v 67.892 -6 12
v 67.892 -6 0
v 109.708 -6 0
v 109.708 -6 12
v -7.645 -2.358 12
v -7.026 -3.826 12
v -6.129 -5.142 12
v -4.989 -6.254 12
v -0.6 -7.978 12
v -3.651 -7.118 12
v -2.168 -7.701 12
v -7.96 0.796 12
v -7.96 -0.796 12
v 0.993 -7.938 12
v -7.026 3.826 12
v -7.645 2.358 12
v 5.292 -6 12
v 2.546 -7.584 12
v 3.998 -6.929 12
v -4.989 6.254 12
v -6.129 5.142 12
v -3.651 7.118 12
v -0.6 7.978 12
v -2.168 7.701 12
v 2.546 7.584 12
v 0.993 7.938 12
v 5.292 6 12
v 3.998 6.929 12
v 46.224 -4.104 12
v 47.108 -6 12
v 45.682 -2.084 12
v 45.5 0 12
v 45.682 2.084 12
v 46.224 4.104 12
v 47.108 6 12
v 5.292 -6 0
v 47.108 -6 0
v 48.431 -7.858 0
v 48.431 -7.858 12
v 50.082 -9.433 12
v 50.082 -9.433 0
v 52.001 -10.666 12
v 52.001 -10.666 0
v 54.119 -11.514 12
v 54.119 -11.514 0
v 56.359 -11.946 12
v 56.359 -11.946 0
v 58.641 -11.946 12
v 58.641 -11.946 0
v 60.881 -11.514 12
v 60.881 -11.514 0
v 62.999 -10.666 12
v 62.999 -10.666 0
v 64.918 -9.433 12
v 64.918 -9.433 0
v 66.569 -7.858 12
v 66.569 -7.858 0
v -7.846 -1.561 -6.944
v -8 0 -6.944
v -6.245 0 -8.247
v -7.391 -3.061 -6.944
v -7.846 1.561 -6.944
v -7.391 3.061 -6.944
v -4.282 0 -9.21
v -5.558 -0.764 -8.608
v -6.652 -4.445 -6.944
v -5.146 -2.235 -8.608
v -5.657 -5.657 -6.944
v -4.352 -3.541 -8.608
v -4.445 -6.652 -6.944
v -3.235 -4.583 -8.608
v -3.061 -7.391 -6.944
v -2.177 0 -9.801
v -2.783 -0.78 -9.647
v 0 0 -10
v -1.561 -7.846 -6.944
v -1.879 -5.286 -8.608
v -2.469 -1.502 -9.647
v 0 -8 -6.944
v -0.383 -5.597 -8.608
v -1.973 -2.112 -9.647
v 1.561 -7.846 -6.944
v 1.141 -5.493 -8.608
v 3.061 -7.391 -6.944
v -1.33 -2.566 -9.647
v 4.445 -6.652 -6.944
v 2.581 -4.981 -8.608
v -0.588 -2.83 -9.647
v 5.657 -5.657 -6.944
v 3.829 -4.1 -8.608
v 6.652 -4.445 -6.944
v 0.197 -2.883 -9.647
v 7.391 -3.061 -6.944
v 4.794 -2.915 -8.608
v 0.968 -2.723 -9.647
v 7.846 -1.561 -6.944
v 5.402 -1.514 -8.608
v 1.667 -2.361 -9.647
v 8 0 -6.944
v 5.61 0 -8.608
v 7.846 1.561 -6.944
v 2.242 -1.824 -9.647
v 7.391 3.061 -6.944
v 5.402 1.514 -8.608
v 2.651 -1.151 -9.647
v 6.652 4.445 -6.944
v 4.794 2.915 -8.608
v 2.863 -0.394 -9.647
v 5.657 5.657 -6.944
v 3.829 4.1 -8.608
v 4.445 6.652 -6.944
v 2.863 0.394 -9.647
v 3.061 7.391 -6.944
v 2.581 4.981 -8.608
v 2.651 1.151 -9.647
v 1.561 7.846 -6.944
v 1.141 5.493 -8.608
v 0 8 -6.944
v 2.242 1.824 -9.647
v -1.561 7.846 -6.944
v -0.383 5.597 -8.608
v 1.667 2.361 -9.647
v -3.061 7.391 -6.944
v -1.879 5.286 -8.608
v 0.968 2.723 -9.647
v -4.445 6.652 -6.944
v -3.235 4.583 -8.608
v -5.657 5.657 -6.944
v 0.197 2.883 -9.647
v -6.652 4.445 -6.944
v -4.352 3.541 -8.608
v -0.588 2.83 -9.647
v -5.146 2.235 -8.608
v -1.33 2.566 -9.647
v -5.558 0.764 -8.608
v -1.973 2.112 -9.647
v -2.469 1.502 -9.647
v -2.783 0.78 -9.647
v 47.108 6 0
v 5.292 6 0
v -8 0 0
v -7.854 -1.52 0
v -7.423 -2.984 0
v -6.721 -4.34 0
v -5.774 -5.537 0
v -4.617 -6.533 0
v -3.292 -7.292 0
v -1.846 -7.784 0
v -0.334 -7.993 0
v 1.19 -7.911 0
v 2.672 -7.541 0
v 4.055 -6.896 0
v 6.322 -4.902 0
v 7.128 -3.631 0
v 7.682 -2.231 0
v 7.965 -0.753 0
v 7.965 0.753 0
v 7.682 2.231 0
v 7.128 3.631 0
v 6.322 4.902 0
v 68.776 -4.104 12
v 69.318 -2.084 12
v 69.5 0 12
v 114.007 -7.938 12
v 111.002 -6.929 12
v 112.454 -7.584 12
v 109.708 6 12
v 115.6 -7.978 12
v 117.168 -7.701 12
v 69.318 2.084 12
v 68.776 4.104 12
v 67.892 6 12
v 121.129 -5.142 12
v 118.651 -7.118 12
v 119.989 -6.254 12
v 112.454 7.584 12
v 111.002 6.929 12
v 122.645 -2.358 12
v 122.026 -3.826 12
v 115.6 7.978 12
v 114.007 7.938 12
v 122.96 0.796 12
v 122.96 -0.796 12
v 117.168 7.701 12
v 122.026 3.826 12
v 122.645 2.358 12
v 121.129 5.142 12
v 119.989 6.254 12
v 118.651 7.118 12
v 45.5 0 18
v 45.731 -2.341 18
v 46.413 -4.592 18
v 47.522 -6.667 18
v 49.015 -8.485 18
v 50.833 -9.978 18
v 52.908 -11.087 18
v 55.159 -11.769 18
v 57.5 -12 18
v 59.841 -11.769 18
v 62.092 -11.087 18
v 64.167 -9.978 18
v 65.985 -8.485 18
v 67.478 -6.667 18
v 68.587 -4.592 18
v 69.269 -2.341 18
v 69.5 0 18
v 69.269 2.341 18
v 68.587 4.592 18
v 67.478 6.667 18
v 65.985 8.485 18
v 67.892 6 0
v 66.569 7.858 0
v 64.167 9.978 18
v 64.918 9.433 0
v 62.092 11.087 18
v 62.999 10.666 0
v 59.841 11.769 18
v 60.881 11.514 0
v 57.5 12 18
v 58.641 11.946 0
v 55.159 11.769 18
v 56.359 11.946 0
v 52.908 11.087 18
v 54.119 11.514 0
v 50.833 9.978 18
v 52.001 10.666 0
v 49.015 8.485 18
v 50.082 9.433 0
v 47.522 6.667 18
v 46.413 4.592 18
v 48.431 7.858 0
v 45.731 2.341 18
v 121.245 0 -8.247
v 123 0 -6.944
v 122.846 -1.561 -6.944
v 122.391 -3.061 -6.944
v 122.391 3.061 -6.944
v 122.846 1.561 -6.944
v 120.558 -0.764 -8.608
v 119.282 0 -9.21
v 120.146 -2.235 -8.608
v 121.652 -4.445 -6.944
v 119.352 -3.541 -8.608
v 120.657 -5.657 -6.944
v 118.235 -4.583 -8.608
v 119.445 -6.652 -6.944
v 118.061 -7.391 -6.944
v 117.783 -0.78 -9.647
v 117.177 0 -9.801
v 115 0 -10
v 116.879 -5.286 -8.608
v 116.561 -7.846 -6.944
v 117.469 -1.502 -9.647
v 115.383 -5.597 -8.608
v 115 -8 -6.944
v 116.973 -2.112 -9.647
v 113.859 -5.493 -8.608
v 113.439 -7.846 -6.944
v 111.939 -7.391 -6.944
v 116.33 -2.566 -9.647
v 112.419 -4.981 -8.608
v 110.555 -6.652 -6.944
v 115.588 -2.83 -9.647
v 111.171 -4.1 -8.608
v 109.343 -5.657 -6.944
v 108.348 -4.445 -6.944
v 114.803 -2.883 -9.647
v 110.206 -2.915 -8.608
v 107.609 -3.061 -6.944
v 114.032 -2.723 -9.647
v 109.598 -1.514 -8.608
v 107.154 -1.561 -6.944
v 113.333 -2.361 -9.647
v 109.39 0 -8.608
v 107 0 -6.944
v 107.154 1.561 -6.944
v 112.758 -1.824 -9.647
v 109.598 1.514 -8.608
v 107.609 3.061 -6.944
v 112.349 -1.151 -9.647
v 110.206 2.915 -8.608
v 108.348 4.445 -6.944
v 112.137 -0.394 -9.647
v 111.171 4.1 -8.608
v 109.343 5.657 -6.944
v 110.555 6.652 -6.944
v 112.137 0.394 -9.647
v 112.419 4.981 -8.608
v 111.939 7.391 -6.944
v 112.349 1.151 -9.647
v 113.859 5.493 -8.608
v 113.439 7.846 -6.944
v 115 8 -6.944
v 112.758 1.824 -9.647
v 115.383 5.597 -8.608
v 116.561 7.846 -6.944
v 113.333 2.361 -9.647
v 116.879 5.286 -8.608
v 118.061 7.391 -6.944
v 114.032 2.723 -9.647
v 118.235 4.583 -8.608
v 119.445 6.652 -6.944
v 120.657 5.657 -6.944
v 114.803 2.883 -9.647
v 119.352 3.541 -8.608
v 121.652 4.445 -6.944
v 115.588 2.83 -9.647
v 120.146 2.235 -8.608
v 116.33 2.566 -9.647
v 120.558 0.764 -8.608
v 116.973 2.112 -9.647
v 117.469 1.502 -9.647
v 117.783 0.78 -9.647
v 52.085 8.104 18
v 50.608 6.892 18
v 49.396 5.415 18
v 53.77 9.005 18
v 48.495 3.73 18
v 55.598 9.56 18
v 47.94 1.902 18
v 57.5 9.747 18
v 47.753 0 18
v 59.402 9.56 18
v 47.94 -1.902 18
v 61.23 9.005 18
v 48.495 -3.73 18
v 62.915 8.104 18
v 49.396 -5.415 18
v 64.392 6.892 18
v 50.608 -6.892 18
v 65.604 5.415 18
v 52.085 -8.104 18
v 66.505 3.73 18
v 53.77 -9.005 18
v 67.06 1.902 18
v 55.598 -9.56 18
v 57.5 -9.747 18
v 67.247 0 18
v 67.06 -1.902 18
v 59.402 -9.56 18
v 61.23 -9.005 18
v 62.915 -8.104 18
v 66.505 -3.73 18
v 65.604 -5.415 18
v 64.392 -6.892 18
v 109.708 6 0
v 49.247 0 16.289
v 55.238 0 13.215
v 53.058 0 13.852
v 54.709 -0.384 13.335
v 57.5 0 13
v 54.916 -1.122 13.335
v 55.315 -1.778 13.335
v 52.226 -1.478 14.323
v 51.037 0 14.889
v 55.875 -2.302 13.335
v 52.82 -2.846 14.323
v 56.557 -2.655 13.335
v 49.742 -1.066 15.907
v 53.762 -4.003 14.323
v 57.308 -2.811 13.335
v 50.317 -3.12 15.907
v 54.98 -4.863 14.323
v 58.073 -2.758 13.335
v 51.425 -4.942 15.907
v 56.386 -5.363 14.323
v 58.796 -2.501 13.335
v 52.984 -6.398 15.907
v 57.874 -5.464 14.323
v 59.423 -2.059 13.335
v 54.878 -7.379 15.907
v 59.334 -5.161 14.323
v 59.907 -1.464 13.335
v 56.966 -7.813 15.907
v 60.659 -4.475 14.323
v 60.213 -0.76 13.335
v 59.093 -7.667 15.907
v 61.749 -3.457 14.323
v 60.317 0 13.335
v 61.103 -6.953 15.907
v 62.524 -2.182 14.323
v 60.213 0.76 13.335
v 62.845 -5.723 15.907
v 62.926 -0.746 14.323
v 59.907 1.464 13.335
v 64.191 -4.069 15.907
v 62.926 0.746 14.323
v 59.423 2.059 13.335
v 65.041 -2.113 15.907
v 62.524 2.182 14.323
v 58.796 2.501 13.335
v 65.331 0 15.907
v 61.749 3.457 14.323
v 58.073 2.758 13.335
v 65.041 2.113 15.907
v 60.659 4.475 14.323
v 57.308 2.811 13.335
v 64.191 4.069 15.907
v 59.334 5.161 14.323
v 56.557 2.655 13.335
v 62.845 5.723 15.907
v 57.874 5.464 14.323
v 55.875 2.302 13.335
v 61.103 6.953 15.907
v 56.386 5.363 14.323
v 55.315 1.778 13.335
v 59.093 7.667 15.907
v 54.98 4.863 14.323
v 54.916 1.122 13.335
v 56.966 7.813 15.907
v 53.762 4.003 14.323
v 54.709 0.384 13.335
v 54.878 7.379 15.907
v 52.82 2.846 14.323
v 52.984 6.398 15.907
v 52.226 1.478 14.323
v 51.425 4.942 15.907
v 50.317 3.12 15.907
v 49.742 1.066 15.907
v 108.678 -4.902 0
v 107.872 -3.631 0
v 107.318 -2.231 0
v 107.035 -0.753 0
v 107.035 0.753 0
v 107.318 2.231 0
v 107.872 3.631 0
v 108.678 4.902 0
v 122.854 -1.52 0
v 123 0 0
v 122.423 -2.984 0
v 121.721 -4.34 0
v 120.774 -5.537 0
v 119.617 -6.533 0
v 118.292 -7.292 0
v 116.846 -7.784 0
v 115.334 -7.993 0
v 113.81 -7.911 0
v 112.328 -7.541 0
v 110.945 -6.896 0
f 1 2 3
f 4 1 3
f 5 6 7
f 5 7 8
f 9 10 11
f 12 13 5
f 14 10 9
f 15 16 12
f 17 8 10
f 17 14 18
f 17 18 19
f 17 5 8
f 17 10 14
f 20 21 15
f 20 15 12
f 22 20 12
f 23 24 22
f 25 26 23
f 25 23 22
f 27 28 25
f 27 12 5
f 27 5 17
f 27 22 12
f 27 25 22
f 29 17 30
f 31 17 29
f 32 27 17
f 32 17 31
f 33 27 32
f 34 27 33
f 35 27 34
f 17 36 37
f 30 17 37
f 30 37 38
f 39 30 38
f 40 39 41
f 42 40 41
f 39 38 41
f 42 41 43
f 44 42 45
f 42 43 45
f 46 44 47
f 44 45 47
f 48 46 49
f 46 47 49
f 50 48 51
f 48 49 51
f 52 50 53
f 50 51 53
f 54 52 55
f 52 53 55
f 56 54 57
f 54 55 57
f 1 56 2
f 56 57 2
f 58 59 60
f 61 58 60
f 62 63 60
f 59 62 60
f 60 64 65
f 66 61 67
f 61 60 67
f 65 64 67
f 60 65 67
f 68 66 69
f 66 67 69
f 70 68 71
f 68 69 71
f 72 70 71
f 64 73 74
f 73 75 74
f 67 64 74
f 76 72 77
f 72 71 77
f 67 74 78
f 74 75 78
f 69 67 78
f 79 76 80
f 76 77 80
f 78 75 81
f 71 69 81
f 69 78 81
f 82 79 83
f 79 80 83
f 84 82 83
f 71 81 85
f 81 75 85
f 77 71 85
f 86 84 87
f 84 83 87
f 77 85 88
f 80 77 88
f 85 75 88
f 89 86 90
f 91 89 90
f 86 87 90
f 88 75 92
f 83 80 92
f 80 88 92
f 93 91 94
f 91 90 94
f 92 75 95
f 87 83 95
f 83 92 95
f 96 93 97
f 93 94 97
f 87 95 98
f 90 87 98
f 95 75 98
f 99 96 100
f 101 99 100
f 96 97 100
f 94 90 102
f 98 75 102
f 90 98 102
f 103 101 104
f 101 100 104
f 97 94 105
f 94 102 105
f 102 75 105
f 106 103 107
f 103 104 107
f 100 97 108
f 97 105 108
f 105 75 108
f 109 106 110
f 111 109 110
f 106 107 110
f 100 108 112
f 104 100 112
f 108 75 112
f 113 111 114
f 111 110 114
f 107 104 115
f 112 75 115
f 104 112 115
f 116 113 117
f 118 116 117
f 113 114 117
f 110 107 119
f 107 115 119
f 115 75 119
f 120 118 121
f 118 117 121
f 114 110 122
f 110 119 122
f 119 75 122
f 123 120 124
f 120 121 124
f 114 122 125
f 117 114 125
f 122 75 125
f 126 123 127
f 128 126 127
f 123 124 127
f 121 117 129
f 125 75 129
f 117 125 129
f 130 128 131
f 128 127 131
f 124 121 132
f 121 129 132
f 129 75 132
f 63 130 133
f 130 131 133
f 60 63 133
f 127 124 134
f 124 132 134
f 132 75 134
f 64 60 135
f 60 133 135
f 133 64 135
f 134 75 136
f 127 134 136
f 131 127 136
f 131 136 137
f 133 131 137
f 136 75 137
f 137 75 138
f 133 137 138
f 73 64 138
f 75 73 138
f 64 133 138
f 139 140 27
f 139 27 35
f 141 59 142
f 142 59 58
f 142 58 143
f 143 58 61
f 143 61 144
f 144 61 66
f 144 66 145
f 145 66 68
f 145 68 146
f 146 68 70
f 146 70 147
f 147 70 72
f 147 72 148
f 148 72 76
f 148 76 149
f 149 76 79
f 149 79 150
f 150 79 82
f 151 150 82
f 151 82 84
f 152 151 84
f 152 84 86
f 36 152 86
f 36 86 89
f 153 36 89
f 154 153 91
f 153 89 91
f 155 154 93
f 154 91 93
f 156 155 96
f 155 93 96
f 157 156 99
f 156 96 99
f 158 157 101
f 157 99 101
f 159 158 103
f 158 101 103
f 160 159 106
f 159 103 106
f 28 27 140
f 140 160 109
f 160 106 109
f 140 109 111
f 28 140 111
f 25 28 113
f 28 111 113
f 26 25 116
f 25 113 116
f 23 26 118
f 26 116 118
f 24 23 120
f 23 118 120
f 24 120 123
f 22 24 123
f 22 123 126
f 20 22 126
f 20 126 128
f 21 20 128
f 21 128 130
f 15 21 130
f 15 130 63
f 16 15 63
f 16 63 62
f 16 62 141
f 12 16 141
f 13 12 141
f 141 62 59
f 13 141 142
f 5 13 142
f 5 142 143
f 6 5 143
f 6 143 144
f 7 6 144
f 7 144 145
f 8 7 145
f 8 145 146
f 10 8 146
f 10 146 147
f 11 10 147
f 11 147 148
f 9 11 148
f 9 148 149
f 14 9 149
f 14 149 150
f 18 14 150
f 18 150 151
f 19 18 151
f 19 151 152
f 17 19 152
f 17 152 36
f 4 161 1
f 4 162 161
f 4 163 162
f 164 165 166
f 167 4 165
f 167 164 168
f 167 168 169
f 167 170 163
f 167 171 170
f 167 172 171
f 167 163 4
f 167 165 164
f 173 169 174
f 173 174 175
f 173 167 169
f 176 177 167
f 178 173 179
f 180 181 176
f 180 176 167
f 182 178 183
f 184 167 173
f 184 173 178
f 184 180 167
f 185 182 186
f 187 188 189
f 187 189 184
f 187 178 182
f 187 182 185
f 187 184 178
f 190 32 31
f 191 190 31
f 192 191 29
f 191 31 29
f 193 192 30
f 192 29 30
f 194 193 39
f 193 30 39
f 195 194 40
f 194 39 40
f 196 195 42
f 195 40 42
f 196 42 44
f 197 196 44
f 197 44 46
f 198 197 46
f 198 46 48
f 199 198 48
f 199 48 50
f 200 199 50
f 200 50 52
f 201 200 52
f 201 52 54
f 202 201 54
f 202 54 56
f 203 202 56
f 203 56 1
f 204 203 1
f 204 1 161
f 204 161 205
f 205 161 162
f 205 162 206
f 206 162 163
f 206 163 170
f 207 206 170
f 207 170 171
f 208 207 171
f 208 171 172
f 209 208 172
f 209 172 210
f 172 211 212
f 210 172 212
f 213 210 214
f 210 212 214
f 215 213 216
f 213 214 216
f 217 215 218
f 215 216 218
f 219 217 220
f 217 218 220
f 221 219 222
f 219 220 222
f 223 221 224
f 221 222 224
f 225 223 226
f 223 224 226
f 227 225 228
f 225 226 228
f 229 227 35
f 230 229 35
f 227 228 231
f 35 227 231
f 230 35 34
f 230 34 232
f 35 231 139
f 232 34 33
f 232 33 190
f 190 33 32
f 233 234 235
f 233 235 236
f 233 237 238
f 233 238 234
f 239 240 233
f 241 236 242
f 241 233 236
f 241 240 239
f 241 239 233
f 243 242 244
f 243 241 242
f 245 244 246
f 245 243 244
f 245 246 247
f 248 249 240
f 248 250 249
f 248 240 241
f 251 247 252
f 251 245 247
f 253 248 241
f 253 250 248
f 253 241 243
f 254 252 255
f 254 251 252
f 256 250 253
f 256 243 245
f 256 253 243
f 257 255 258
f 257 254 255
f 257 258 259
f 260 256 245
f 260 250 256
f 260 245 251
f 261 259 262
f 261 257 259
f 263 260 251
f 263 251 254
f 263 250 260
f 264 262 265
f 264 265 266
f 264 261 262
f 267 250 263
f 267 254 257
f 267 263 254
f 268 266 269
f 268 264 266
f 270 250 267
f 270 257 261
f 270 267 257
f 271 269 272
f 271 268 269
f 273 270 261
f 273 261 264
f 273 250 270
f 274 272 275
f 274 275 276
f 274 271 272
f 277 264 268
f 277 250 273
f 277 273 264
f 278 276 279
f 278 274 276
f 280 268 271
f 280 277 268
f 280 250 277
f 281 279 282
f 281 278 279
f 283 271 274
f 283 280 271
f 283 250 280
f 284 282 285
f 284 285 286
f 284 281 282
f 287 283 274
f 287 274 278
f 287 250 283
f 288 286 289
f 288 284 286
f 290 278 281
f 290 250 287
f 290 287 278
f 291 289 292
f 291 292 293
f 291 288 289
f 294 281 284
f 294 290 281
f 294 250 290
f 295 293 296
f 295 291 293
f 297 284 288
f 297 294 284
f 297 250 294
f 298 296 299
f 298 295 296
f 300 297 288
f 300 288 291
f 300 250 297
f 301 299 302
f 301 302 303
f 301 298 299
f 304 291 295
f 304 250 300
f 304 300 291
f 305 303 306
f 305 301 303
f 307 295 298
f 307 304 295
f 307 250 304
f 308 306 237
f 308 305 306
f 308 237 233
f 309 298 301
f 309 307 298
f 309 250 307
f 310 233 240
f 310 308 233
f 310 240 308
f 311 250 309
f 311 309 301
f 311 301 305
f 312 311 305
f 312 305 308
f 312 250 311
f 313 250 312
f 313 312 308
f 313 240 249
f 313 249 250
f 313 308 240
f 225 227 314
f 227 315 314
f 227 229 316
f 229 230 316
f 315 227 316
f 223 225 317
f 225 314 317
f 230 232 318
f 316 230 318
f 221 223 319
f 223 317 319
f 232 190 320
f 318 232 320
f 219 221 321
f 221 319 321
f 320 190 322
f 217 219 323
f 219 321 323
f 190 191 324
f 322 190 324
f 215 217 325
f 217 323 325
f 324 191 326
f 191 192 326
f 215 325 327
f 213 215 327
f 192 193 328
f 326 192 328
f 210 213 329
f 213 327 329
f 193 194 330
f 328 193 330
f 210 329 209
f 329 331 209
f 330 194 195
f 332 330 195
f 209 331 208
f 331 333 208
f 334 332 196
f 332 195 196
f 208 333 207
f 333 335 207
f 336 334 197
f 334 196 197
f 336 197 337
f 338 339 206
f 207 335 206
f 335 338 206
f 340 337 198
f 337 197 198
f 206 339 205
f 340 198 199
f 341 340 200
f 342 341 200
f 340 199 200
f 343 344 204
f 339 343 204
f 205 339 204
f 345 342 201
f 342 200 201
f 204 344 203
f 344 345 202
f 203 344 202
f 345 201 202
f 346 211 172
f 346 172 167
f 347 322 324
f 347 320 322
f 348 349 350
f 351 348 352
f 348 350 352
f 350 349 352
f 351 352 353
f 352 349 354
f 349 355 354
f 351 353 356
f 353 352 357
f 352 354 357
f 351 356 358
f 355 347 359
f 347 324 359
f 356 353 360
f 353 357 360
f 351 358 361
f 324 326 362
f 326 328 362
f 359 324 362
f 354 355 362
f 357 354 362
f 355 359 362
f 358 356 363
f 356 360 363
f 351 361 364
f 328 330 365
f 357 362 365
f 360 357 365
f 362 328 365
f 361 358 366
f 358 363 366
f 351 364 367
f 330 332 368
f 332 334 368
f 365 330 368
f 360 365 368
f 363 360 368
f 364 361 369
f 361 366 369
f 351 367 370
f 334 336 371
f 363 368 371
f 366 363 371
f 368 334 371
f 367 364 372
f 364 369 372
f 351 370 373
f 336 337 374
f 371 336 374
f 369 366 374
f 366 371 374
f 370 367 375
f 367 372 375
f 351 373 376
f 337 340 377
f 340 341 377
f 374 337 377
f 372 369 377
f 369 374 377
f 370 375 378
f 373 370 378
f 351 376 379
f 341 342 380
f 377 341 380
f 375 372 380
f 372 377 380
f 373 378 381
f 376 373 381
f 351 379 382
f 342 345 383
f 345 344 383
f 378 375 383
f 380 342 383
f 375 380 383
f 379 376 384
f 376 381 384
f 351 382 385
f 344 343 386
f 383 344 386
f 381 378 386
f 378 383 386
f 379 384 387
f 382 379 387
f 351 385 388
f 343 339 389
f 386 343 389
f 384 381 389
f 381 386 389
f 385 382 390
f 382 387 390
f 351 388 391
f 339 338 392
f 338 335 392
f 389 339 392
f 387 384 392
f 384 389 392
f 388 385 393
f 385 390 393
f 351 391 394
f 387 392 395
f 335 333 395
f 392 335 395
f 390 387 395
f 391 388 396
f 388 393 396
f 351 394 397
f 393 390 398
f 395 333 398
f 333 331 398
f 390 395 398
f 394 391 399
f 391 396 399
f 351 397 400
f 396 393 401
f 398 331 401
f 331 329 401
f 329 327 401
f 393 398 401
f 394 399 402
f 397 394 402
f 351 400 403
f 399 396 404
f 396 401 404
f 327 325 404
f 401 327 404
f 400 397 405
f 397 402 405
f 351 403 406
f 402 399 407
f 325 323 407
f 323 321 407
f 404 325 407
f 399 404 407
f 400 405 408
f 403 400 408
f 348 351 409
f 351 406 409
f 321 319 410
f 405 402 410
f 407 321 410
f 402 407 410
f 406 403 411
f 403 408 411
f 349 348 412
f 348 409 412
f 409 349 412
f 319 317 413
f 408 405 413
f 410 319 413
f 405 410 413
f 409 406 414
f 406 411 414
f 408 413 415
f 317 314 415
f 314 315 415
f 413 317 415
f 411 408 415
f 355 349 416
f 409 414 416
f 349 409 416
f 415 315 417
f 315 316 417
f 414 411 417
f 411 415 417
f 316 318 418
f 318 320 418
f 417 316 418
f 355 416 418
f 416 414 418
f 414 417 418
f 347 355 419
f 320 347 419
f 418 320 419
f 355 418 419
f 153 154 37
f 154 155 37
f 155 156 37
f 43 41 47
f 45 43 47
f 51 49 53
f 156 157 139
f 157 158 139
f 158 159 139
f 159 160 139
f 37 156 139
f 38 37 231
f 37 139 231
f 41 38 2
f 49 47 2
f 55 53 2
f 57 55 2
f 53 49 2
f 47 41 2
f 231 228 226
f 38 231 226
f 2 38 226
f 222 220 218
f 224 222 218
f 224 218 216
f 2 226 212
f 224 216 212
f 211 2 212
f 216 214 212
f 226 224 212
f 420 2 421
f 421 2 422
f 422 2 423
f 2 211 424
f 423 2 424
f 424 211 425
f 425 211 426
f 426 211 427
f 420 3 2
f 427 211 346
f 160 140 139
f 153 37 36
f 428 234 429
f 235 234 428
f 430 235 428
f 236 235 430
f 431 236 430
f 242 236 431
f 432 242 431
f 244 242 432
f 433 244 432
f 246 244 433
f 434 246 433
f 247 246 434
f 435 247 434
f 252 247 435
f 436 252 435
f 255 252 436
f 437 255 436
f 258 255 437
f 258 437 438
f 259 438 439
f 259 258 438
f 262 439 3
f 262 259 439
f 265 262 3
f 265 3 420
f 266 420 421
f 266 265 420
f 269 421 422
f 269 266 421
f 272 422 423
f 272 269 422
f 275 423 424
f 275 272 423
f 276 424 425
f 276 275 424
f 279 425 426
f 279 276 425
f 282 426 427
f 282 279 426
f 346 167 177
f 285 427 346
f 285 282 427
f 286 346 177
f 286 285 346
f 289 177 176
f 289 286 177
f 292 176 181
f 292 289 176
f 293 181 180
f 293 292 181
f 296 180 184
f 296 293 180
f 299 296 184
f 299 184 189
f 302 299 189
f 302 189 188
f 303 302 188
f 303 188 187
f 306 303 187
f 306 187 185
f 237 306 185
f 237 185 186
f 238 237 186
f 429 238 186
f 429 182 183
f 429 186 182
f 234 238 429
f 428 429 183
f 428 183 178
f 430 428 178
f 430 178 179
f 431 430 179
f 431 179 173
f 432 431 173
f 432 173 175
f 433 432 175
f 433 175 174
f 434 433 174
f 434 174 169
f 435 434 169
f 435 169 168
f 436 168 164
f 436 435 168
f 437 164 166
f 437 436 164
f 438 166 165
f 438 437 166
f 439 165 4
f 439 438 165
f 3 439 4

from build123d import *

# Parameters (mm, degrees)
SKETCH_1_R      = 8
SKETCH_1_R_2    = 12
SKETCH_1_W      = 115
SKETCH_1_H      = 12
EXTRUDE_1_DEPTH = 12


with BuildPart() as part:
    # 草图1 → 凸台-拉伸1 (new body)
    with BuildSketch(Plane.XY):
        with Locations((115, 0)):
            Circle(SKETCH_1_R)
        Circle(SKETCH_1_R)
        with Locations((57.5, 0)):
            Circle(SKETCH_1_R_2)
        with Locations((57.5, 0)):
            Rectangle(SKETCH_1_W, SKETCH_1_H)
    extrude(amount=EXTRUDE_1_DEPTH)

    # 草图2 → 旋转2 (revolve)
    with BuildSketch(Plane(origin=(0, 0, 0), x_dir=(1, 0, 0), z_dir=(0, 1, 0))):
        with BuildLine():
            ThreePointArc((-8, 6.94427191), (-4.281865077, 9.210068308), (0, 10))
            Line((0, 10), (0, 0))
            Line((0, 0), (-8, 0))
            Line((-8, 0), (-8, 6.94427191))
        make_face()
    revolve_2 = revolve(axis=Axis((0, 0, -10), (0, 0, 1)))

    # 镜向1: 旋转2 across plane
    add(revolve_2.mirror(Plane(origin=(57.5, 0, 0), x_dir=(0, 0, 1), z_dir=(1, 0, 0))))

    # 草图3 → 旋转3 (revolve)
    with BuildSketch(Plane(origin=(0, 0, 0), x_dir=(1, 0, 0), z_dir=(0, 1, 0))):
        with BuildLine():
            Line((57.5, -12), (57.5, -13))
            ThreePointArc((57.5, -13), (52.022774425, -14.322921748), (47.753205655, -18))
            Line((47.753205655, -18), (45.5, -18))
            Line((45.5, -18), (45.5, -12))
            Line((45.5, -12), (57.5, -12))
        make_face()
    revolve(axis=Axis((57.5, 0, 12), (0, 0, 1)))


solid = part.part
